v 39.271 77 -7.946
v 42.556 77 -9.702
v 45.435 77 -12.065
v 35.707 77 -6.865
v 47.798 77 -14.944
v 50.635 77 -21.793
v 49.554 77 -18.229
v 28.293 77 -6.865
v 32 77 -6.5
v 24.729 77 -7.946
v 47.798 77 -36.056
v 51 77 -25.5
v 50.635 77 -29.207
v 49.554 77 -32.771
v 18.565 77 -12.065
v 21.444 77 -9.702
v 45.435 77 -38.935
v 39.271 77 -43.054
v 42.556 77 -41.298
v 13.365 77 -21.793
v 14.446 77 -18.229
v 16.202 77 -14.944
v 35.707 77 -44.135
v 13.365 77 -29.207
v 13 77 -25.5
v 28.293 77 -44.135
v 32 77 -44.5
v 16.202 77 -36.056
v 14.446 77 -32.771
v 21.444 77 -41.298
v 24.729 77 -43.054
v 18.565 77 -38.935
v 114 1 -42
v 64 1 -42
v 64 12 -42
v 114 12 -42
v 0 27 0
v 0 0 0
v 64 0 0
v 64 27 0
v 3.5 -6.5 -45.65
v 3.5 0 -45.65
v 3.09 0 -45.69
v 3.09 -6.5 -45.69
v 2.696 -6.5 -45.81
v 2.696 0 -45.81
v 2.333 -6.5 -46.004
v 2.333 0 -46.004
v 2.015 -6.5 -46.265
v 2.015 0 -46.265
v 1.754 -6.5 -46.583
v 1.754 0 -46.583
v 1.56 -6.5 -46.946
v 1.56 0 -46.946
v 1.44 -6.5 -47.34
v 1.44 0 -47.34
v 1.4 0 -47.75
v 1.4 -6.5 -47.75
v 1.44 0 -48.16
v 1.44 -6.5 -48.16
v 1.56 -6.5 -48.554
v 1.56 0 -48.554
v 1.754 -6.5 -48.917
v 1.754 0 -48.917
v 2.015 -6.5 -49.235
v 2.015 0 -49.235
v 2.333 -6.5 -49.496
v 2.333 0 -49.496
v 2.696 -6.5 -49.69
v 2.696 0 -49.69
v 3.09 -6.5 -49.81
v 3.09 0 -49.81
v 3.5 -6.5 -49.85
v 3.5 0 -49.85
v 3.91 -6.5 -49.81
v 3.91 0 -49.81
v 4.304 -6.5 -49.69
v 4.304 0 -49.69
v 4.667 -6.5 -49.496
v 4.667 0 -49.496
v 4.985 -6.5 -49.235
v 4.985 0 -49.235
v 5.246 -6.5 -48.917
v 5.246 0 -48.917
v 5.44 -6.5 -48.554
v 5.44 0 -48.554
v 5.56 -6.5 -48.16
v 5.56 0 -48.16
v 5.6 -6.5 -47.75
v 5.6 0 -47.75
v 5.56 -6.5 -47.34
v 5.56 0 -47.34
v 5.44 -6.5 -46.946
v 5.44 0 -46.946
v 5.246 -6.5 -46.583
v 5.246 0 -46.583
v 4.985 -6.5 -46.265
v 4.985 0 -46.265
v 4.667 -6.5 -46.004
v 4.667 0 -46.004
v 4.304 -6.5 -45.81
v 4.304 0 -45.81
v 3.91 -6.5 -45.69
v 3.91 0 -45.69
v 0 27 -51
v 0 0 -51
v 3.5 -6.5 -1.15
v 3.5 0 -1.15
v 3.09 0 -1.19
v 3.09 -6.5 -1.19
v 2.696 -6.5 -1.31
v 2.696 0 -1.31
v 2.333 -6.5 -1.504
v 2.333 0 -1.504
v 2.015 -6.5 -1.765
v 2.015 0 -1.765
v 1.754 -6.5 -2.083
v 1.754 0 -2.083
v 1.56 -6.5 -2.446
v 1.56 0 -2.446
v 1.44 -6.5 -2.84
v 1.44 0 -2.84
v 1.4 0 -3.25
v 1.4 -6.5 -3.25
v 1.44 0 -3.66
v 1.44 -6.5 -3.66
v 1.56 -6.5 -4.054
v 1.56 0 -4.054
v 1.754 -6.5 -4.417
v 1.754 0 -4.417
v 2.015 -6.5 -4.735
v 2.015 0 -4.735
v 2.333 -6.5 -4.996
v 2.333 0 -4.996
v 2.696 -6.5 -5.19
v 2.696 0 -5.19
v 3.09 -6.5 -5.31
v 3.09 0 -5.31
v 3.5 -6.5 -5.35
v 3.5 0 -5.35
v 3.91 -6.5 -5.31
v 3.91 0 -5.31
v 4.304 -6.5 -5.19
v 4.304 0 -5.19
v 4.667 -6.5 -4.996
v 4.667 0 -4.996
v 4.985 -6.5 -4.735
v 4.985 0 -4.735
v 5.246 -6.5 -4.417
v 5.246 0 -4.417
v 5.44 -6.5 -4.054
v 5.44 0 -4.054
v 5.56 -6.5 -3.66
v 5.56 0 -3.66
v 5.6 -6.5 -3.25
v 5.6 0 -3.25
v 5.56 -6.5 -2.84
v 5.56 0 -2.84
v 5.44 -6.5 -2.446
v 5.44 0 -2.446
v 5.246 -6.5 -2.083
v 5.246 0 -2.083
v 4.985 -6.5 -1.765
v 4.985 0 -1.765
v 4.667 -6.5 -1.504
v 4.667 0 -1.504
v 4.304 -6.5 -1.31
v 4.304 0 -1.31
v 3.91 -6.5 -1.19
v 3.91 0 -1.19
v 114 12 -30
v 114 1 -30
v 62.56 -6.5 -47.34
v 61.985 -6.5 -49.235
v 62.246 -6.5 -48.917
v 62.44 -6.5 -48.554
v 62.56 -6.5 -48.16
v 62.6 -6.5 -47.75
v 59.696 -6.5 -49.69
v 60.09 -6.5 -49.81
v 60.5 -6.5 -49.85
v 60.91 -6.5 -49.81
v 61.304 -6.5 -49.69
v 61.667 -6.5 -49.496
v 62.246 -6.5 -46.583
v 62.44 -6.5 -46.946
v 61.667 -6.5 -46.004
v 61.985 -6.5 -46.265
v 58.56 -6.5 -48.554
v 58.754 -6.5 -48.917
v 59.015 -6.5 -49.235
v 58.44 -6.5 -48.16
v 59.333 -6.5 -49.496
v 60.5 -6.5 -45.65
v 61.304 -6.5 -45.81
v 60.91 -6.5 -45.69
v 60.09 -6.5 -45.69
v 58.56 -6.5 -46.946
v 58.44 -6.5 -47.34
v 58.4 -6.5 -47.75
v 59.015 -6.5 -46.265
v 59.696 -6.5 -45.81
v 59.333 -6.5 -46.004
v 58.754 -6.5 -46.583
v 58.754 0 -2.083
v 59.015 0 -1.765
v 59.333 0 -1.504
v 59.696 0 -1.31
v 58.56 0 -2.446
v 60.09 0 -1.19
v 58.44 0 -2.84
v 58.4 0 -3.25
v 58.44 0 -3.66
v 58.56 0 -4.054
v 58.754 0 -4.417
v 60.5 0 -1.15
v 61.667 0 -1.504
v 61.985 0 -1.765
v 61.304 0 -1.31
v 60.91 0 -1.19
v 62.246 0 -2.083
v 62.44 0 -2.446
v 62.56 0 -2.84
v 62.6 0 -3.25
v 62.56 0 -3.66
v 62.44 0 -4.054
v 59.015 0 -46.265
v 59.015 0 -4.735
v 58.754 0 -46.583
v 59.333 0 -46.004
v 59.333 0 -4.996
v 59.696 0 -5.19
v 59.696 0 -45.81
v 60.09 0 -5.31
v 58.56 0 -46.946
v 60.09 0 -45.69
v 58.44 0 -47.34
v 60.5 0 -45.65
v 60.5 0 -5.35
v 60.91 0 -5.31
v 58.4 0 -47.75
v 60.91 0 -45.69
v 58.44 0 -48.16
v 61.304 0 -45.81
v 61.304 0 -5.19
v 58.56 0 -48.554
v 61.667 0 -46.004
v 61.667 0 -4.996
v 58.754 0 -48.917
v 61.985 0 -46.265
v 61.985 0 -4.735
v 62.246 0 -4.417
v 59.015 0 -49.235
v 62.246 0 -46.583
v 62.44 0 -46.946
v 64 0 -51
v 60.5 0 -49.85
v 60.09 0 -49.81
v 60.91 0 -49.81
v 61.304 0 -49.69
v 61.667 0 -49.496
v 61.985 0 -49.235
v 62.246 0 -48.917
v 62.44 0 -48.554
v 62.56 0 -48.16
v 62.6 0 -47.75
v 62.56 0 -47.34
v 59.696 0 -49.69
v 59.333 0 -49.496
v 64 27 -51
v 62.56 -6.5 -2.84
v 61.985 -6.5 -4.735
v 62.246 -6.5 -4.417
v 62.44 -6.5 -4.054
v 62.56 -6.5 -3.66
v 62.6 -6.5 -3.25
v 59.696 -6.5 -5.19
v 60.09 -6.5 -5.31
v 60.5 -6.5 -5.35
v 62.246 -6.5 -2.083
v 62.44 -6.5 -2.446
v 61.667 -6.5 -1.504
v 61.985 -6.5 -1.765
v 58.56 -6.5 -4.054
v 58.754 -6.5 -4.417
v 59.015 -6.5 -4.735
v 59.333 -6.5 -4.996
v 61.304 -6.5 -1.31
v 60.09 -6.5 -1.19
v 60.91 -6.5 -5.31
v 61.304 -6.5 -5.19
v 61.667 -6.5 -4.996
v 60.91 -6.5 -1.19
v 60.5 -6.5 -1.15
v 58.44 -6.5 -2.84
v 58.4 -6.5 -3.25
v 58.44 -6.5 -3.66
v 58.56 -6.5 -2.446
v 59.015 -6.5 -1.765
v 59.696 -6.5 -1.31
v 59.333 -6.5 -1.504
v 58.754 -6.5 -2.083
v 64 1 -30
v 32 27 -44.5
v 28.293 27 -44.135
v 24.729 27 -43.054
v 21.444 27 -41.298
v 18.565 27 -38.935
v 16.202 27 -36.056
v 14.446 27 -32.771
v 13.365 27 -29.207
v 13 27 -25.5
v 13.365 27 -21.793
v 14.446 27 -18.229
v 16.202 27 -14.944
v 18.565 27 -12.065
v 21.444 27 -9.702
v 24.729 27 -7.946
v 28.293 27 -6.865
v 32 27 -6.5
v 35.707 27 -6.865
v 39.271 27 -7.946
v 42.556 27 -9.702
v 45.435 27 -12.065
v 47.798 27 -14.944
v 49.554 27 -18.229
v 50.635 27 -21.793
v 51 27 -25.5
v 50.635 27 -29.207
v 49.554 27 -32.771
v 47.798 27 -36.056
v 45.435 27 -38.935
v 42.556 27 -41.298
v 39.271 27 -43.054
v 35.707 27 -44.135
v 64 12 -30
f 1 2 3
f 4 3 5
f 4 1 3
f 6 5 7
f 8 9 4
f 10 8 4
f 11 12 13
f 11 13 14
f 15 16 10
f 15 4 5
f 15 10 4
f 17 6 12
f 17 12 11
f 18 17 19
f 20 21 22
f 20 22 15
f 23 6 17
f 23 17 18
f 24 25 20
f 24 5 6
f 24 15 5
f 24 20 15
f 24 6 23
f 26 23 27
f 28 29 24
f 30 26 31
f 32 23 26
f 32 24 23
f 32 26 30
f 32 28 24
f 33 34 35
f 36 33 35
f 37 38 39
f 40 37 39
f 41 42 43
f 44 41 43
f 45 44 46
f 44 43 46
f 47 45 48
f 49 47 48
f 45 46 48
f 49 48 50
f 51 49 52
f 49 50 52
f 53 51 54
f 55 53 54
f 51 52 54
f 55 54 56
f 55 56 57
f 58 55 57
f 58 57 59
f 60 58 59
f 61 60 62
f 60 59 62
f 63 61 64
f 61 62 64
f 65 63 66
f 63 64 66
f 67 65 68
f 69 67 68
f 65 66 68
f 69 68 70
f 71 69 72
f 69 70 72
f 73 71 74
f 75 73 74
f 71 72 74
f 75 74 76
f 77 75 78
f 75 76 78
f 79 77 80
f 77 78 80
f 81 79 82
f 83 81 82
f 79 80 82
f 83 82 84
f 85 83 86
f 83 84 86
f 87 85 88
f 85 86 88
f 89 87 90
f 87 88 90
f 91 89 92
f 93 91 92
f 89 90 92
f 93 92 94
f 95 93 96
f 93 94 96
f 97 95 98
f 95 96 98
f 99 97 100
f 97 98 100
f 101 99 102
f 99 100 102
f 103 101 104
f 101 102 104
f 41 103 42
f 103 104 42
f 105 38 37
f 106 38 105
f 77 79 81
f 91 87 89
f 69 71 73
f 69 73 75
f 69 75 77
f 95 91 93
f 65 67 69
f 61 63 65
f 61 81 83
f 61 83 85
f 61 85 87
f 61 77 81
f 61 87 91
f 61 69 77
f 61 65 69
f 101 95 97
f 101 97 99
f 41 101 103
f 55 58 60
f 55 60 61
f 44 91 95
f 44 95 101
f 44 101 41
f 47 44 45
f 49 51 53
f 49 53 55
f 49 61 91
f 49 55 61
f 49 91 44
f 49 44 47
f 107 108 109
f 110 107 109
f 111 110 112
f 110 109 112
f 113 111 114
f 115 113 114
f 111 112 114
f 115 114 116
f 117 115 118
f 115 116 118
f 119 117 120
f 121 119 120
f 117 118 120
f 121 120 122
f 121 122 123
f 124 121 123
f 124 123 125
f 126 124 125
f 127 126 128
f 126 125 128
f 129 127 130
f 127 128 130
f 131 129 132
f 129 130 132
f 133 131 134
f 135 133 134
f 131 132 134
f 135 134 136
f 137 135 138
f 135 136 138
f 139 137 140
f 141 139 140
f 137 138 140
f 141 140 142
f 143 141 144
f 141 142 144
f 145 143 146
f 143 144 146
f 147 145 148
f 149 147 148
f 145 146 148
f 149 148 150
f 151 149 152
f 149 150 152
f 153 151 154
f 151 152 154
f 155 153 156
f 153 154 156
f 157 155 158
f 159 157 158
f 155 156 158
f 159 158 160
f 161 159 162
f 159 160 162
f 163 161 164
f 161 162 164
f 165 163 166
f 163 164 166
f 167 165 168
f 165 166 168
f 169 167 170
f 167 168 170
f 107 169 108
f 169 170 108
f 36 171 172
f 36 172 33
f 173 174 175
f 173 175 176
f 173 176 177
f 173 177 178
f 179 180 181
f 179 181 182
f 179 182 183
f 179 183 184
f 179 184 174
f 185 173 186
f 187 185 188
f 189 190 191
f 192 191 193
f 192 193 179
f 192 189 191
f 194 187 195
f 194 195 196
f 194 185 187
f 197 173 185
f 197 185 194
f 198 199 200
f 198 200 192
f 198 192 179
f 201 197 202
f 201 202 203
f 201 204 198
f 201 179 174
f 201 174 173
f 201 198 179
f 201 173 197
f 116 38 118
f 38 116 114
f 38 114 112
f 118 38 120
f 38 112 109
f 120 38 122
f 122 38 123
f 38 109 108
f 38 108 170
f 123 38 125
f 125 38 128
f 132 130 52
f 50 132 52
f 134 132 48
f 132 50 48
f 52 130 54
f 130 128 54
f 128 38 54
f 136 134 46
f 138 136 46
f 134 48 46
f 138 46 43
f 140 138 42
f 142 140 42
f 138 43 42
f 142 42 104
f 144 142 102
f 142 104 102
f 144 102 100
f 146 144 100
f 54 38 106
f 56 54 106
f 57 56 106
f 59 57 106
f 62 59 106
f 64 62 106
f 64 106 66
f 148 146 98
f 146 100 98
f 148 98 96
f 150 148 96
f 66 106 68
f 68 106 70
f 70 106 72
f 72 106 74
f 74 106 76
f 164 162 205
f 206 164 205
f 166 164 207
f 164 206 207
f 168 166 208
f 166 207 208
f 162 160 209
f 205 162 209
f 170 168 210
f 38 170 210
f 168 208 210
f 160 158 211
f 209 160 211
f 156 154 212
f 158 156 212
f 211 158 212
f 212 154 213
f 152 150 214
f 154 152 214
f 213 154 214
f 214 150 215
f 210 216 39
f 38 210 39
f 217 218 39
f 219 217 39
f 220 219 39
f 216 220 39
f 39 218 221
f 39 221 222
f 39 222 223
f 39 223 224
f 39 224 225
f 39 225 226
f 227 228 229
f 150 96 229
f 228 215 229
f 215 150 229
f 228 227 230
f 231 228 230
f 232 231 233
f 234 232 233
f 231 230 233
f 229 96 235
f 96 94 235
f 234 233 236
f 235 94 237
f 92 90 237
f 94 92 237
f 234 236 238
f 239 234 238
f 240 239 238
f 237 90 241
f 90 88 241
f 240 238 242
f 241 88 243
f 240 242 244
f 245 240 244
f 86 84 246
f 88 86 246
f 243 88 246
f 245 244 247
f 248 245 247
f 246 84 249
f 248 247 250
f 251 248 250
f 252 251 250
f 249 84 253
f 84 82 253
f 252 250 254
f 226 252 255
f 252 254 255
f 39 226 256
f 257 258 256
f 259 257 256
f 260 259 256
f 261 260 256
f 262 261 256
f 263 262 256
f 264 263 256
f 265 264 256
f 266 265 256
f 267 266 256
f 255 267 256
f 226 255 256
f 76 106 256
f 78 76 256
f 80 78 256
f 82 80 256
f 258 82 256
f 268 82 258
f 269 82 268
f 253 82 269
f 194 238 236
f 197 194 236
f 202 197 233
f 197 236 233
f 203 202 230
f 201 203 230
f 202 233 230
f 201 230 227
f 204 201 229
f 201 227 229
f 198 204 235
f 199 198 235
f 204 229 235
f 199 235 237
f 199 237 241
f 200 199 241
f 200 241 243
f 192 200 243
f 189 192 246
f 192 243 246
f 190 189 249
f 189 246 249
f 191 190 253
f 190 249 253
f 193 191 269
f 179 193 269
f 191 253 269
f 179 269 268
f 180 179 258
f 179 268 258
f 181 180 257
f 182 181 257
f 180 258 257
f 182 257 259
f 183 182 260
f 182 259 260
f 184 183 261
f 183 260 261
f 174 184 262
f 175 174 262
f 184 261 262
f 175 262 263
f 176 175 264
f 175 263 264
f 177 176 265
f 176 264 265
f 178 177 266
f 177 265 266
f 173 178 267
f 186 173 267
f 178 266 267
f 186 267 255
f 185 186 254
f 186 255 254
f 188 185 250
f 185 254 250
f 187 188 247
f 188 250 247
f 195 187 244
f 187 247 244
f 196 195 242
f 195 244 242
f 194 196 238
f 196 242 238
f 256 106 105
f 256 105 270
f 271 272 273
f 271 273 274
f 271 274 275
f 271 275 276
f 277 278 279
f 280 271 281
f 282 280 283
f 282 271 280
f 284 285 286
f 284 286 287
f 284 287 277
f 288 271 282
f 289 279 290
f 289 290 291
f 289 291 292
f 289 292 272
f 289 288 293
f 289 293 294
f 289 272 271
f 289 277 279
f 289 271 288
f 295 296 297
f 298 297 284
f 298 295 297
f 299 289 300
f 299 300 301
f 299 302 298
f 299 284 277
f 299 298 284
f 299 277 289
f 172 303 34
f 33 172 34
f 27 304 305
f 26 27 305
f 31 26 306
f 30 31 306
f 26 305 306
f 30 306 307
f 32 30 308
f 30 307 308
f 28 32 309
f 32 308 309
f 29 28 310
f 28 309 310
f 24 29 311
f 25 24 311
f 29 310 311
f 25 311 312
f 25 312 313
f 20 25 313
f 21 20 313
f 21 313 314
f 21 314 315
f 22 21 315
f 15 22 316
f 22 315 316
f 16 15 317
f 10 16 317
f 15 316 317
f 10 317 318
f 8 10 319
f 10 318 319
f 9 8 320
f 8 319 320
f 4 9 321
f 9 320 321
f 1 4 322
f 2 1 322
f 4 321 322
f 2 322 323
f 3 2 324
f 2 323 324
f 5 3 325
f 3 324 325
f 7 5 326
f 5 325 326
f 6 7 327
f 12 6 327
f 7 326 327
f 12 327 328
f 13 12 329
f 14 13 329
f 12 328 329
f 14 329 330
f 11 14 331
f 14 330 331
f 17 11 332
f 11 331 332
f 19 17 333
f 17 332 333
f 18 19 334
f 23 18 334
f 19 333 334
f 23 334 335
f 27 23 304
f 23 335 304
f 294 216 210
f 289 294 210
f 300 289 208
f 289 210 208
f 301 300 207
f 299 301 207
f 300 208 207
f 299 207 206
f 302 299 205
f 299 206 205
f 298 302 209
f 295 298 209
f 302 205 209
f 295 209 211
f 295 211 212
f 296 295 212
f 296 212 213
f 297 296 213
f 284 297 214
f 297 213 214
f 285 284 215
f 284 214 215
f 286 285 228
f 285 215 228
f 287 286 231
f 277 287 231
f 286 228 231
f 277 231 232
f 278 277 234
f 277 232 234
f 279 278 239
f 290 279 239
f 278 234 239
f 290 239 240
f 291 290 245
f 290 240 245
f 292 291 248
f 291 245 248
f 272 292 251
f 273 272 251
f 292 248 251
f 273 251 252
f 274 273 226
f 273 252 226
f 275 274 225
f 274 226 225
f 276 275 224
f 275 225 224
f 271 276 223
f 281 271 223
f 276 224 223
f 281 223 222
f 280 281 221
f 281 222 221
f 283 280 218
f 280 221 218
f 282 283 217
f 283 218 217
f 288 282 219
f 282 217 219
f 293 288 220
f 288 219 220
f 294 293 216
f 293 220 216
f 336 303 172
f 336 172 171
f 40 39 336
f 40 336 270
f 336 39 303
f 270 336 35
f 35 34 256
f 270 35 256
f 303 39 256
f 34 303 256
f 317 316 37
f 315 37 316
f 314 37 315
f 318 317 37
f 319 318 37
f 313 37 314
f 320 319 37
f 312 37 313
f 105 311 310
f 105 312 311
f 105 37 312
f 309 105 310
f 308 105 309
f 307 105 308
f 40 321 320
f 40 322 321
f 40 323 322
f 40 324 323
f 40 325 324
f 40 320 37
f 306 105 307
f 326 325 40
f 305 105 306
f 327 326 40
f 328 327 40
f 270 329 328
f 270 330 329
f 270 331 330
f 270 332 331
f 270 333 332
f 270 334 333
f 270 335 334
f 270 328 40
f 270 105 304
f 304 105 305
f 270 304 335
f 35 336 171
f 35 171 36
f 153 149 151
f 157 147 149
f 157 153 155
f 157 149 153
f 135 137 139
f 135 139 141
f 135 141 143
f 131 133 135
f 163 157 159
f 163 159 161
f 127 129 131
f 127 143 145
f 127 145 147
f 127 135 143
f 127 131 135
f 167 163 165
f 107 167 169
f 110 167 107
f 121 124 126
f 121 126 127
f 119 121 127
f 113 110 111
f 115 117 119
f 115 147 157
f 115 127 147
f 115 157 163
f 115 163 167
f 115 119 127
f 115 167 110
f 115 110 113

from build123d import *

# Parameters (mm, degrees)
SKETCH1_W           = 64
SKETCH1_H           = 51
BOSS_EXTRUDE1_DEPTH = 27
SKETCH2_R           = 19
BOSS_EXTRUDE2_DEPTH = 50
SKETCH3_R           = 2.1
BOSS_EXTRUDE3_DEPTH = 6.5
SKETCH4_W           = 12
SKETCH4_H           = 11
BOSS_EXTRUDE4_DEPTH = 50


with BuildPart() as part:
    # Sketch1 → Boss-Extrude1 (new body)
    with BuildSketch(Plane(origin=(0, 0, 0), x_dir=(1, 0, 0), z_dir=(0, 1, 0))):
        with Locations((32, 25.5)):
            Rectangle(SKETCH1_W, SKETCH1_H)
    extrude(amount=BOSS_EXTRUDE1_DEPTH)

    # Sketch2 → Boss-Extrude2 (add)
    with BuildSketch(Plane(origin=(0, 27, 0), x_dir=(1, 0, 0), z_dir=(0, 1, 0))):
        with Locations(Location((32, 25.5, 0), (0, 0, 90))):
            Circle(SKETCH2_R)
    extrude(amount=BOSS_EXTRUDE2_DEPTH)

    # Sketch3 → Boss-Extrude3 (add)
    with BuildSketch(Plane.XZ):
        with Locations(Location((3.5, -3.25, 0), (0, 0, 90))):
            Circle(SKETCH3_R)
        with Locations(Location((60.5, -3.25, 0), (0, 0, 90))):
            Circle(SKETCH3_R)
        with Locations(Location((3.5, -47.75, 0), (0, 0, 90))):
            Circle(SKETCH3_R)
        with Locations(Location((60.5, -47.75, 0), (0, 0, 90))):
            Circle(SKETCH3_R)
    extrude(amount=BOSS_EXTRUDE3_DEPTH)

    # Sketch4 → Boss-Extrude4 (add)
    with BuildSketch(Plane(origin=(64, 0, 0), x_dir=(0, 0, -1), z_dir=(1, 0, 0))):
        with Locations((36, 6.5)):
            Rectangle(SKETCH4_W, SKETCH4_H)
    extrude(amount=BOSS_EXTRUDE4_DEPTH)


solid = part.part
